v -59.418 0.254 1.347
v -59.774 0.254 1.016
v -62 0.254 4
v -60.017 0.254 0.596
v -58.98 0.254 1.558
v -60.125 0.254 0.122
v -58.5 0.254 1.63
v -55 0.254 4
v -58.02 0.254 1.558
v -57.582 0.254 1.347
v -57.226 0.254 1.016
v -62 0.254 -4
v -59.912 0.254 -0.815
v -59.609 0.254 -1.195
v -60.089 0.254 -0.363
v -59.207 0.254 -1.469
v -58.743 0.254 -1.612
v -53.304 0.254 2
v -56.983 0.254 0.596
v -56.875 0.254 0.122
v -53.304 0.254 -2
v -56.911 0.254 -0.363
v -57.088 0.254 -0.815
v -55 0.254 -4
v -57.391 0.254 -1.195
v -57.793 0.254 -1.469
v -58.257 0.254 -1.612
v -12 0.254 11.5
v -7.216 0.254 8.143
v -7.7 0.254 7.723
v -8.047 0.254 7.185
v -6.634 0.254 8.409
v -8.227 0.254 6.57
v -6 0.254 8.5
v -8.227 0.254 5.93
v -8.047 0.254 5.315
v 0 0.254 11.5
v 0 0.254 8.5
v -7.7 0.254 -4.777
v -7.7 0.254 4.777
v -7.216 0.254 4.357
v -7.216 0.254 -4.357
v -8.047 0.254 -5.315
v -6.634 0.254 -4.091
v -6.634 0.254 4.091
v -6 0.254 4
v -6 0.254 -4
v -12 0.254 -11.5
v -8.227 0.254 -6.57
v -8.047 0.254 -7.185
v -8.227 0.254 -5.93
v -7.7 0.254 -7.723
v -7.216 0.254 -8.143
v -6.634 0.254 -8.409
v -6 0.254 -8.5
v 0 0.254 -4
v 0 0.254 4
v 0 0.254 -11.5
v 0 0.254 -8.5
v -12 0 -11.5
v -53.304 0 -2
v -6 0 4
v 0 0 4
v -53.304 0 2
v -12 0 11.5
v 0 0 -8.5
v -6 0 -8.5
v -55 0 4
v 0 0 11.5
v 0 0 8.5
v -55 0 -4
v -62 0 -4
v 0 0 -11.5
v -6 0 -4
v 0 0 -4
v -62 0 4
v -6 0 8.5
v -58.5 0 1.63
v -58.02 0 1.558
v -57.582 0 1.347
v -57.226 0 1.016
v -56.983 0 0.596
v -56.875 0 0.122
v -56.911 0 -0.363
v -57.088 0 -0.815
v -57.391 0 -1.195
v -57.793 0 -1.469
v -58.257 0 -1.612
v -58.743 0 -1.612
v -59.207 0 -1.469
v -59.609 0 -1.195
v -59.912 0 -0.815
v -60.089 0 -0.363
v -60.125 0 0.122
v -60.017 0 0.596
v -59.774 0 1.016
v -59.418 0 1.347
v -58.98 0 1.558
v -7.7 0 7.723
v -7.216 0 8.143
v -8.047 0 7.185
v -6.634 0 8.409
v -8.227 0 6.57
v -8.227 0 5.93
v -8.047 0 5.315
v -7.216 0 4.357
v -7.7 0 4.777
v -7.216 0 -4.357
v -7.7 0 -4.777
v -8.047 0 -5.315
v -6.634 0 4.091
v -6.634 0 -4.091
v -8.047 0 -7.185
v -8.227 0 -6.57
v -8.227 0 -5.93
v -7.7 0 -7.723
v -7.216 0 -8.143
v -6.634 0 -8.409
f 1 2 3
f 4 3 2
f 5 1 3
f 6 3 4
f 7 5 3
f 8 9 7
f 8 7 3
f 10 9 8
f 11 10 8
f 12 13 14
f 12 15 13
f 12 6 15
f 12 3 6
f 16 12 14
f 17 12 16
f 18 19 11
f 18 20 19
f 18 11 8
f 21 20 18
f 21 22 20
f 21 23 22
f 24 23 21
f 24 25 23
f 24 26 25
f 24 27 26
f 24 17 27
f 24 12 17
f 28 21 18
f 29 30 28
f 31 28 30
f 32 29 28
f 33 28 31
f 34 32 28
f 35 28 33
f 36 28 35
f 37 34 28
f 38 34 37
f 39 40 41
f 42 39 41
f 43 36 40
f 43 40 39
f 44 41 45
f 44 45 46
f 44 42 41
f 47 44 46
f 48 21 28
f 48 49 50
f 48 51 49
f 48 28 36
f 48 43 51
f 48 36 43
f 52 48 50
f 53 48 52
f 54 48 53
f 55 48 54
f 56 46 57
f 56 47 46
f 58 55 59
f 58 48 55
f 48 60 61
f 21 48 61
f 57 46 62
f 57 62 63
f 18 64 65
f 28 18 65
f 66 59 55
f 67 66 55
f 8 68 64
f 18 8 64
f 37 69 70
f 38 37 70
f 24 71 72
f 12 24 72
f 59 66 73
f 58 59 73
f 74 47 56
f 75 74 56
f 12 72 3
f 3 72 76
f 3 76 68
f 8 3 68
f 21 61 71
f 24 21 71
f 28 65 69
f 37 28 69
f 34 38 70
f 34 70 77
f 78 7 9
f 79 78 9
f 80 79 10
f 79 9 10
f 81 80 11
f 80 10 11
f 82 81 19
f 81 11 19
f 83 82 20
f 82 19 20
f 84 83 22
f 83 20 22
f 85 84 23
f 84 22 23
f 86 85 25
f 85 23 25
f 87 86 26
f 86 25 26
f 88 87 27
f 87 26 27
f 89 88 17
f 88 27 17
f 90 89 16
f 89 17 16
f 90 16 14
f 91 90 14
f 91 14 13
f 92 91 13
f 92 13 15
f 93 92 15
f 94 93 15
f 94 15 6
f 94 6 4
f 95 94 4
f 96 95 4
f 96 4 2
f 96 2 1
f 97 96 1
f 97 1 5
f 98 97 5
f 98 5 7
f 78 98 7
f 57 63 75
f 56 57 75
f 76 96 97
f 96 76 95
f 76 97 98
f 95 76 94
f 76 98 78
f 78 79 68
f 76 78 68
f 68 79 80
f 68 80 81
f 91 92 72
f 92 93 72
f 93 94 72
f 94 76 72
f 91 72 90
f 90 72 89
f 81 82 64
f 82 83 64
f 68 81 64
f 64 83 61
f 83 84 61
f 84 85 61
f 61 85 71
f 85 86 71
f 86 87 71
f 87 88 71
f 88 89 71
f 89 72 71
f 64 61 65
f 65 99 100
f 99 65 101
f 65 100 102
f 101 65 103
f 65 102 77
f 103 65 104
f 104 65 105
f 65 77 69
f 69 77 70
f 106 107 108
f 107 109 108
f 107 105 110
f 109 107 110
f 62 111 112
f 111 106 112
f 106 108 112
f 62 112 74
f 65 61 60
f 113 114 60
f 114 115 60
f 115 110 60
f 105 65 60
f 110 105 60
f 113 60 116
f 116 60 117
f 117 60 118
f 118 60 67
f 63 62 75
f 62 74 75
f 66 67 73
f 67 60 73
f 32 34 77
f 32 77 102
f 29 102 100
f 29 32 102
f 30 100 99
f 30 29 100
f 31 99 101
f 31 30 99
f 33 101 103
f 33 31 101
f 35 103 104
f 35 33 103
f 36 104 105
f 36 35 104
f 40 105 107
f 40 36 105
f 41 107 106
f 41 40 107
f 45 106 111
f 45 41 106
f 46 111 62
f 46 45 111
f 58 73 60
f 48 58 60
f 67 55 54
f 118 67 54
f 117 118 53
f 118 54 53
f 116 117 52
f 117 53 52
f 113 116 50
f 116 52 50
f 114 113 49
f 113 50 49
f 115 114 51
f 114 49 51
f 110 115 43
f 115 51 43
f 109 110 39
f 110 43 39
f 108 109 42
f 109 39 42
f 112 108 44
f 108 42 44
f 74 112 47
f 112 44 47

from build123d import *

# Parameters (mm, degrees)
EXTRUDE1_DEPTH = 0.254
EXTRUDE2_DEPTH = 1.254
SKETCH3_R      = 1.63
EXTRUDE3_DEPTH = 1.254


with BuildPart() as part:
    # Sketch1 → Extrude1 (new body)
    with BuildSketch(Plane(origin=(0, 0, 0), x_dir=(1, 0, 0), z_dir=(0, 1, 0))):
        Polygon((0, -11.5), (0, 11.5), (-12, 11.5), (-53.304347826, 2), (-55, 4), (-62, 4), (-62, -4), (-55, -4), (-53.304347826, -2), (-12, -11.5), align=None)
    extrude(amount=EXTRUDE1_DEPTH)

    # Sketch2 → Extrude2 (cut, through all)
    with BuildSketch(Plane(origin=(0, 0.254, 0), x_dir=(1, 0, 0), z_dir=(0, 1, 0))):
        with BuildLine():
            Line((-6, 4), (0, 4))
            Line((0, 4), (0, 8.5))
            Line((0, 8.5), (-6, 8.5))
            ThreePointArc((-6, 8.5), (-8.25, 6.25), (-6, 4))
        make_face()
        with BuildLine():
            Line((0, -8.5), (-6, -8.5))
            ThreePointArc((-6, -8.5), (-8.25, -6.25), (-6, -4))
            Line((-6, -4), (0, -4))
            Line((0, -4), (0, -8.5))
        make_face()
    extrude(amount=-EXTRUDE2_DEPTH, mode=Mode.SUBTRACT)

    # Sketch3 → Extrude3 (cut, through all)
    with BuildSketch(Plane(origin=(0, 0.254, 0), x_dir=(1, 0, 0), z_dir=(0, 1, 0))):
        with Locations(Location((-58.5, 0, 0), (0, 0, 270))):  # turned: the seam where the file's is
            Circle(SKETCH3_R)
    extrude(amount=-EXTRUDE3_DEPTH, mode=Mode.SUBTRACT)


solid = part.part
